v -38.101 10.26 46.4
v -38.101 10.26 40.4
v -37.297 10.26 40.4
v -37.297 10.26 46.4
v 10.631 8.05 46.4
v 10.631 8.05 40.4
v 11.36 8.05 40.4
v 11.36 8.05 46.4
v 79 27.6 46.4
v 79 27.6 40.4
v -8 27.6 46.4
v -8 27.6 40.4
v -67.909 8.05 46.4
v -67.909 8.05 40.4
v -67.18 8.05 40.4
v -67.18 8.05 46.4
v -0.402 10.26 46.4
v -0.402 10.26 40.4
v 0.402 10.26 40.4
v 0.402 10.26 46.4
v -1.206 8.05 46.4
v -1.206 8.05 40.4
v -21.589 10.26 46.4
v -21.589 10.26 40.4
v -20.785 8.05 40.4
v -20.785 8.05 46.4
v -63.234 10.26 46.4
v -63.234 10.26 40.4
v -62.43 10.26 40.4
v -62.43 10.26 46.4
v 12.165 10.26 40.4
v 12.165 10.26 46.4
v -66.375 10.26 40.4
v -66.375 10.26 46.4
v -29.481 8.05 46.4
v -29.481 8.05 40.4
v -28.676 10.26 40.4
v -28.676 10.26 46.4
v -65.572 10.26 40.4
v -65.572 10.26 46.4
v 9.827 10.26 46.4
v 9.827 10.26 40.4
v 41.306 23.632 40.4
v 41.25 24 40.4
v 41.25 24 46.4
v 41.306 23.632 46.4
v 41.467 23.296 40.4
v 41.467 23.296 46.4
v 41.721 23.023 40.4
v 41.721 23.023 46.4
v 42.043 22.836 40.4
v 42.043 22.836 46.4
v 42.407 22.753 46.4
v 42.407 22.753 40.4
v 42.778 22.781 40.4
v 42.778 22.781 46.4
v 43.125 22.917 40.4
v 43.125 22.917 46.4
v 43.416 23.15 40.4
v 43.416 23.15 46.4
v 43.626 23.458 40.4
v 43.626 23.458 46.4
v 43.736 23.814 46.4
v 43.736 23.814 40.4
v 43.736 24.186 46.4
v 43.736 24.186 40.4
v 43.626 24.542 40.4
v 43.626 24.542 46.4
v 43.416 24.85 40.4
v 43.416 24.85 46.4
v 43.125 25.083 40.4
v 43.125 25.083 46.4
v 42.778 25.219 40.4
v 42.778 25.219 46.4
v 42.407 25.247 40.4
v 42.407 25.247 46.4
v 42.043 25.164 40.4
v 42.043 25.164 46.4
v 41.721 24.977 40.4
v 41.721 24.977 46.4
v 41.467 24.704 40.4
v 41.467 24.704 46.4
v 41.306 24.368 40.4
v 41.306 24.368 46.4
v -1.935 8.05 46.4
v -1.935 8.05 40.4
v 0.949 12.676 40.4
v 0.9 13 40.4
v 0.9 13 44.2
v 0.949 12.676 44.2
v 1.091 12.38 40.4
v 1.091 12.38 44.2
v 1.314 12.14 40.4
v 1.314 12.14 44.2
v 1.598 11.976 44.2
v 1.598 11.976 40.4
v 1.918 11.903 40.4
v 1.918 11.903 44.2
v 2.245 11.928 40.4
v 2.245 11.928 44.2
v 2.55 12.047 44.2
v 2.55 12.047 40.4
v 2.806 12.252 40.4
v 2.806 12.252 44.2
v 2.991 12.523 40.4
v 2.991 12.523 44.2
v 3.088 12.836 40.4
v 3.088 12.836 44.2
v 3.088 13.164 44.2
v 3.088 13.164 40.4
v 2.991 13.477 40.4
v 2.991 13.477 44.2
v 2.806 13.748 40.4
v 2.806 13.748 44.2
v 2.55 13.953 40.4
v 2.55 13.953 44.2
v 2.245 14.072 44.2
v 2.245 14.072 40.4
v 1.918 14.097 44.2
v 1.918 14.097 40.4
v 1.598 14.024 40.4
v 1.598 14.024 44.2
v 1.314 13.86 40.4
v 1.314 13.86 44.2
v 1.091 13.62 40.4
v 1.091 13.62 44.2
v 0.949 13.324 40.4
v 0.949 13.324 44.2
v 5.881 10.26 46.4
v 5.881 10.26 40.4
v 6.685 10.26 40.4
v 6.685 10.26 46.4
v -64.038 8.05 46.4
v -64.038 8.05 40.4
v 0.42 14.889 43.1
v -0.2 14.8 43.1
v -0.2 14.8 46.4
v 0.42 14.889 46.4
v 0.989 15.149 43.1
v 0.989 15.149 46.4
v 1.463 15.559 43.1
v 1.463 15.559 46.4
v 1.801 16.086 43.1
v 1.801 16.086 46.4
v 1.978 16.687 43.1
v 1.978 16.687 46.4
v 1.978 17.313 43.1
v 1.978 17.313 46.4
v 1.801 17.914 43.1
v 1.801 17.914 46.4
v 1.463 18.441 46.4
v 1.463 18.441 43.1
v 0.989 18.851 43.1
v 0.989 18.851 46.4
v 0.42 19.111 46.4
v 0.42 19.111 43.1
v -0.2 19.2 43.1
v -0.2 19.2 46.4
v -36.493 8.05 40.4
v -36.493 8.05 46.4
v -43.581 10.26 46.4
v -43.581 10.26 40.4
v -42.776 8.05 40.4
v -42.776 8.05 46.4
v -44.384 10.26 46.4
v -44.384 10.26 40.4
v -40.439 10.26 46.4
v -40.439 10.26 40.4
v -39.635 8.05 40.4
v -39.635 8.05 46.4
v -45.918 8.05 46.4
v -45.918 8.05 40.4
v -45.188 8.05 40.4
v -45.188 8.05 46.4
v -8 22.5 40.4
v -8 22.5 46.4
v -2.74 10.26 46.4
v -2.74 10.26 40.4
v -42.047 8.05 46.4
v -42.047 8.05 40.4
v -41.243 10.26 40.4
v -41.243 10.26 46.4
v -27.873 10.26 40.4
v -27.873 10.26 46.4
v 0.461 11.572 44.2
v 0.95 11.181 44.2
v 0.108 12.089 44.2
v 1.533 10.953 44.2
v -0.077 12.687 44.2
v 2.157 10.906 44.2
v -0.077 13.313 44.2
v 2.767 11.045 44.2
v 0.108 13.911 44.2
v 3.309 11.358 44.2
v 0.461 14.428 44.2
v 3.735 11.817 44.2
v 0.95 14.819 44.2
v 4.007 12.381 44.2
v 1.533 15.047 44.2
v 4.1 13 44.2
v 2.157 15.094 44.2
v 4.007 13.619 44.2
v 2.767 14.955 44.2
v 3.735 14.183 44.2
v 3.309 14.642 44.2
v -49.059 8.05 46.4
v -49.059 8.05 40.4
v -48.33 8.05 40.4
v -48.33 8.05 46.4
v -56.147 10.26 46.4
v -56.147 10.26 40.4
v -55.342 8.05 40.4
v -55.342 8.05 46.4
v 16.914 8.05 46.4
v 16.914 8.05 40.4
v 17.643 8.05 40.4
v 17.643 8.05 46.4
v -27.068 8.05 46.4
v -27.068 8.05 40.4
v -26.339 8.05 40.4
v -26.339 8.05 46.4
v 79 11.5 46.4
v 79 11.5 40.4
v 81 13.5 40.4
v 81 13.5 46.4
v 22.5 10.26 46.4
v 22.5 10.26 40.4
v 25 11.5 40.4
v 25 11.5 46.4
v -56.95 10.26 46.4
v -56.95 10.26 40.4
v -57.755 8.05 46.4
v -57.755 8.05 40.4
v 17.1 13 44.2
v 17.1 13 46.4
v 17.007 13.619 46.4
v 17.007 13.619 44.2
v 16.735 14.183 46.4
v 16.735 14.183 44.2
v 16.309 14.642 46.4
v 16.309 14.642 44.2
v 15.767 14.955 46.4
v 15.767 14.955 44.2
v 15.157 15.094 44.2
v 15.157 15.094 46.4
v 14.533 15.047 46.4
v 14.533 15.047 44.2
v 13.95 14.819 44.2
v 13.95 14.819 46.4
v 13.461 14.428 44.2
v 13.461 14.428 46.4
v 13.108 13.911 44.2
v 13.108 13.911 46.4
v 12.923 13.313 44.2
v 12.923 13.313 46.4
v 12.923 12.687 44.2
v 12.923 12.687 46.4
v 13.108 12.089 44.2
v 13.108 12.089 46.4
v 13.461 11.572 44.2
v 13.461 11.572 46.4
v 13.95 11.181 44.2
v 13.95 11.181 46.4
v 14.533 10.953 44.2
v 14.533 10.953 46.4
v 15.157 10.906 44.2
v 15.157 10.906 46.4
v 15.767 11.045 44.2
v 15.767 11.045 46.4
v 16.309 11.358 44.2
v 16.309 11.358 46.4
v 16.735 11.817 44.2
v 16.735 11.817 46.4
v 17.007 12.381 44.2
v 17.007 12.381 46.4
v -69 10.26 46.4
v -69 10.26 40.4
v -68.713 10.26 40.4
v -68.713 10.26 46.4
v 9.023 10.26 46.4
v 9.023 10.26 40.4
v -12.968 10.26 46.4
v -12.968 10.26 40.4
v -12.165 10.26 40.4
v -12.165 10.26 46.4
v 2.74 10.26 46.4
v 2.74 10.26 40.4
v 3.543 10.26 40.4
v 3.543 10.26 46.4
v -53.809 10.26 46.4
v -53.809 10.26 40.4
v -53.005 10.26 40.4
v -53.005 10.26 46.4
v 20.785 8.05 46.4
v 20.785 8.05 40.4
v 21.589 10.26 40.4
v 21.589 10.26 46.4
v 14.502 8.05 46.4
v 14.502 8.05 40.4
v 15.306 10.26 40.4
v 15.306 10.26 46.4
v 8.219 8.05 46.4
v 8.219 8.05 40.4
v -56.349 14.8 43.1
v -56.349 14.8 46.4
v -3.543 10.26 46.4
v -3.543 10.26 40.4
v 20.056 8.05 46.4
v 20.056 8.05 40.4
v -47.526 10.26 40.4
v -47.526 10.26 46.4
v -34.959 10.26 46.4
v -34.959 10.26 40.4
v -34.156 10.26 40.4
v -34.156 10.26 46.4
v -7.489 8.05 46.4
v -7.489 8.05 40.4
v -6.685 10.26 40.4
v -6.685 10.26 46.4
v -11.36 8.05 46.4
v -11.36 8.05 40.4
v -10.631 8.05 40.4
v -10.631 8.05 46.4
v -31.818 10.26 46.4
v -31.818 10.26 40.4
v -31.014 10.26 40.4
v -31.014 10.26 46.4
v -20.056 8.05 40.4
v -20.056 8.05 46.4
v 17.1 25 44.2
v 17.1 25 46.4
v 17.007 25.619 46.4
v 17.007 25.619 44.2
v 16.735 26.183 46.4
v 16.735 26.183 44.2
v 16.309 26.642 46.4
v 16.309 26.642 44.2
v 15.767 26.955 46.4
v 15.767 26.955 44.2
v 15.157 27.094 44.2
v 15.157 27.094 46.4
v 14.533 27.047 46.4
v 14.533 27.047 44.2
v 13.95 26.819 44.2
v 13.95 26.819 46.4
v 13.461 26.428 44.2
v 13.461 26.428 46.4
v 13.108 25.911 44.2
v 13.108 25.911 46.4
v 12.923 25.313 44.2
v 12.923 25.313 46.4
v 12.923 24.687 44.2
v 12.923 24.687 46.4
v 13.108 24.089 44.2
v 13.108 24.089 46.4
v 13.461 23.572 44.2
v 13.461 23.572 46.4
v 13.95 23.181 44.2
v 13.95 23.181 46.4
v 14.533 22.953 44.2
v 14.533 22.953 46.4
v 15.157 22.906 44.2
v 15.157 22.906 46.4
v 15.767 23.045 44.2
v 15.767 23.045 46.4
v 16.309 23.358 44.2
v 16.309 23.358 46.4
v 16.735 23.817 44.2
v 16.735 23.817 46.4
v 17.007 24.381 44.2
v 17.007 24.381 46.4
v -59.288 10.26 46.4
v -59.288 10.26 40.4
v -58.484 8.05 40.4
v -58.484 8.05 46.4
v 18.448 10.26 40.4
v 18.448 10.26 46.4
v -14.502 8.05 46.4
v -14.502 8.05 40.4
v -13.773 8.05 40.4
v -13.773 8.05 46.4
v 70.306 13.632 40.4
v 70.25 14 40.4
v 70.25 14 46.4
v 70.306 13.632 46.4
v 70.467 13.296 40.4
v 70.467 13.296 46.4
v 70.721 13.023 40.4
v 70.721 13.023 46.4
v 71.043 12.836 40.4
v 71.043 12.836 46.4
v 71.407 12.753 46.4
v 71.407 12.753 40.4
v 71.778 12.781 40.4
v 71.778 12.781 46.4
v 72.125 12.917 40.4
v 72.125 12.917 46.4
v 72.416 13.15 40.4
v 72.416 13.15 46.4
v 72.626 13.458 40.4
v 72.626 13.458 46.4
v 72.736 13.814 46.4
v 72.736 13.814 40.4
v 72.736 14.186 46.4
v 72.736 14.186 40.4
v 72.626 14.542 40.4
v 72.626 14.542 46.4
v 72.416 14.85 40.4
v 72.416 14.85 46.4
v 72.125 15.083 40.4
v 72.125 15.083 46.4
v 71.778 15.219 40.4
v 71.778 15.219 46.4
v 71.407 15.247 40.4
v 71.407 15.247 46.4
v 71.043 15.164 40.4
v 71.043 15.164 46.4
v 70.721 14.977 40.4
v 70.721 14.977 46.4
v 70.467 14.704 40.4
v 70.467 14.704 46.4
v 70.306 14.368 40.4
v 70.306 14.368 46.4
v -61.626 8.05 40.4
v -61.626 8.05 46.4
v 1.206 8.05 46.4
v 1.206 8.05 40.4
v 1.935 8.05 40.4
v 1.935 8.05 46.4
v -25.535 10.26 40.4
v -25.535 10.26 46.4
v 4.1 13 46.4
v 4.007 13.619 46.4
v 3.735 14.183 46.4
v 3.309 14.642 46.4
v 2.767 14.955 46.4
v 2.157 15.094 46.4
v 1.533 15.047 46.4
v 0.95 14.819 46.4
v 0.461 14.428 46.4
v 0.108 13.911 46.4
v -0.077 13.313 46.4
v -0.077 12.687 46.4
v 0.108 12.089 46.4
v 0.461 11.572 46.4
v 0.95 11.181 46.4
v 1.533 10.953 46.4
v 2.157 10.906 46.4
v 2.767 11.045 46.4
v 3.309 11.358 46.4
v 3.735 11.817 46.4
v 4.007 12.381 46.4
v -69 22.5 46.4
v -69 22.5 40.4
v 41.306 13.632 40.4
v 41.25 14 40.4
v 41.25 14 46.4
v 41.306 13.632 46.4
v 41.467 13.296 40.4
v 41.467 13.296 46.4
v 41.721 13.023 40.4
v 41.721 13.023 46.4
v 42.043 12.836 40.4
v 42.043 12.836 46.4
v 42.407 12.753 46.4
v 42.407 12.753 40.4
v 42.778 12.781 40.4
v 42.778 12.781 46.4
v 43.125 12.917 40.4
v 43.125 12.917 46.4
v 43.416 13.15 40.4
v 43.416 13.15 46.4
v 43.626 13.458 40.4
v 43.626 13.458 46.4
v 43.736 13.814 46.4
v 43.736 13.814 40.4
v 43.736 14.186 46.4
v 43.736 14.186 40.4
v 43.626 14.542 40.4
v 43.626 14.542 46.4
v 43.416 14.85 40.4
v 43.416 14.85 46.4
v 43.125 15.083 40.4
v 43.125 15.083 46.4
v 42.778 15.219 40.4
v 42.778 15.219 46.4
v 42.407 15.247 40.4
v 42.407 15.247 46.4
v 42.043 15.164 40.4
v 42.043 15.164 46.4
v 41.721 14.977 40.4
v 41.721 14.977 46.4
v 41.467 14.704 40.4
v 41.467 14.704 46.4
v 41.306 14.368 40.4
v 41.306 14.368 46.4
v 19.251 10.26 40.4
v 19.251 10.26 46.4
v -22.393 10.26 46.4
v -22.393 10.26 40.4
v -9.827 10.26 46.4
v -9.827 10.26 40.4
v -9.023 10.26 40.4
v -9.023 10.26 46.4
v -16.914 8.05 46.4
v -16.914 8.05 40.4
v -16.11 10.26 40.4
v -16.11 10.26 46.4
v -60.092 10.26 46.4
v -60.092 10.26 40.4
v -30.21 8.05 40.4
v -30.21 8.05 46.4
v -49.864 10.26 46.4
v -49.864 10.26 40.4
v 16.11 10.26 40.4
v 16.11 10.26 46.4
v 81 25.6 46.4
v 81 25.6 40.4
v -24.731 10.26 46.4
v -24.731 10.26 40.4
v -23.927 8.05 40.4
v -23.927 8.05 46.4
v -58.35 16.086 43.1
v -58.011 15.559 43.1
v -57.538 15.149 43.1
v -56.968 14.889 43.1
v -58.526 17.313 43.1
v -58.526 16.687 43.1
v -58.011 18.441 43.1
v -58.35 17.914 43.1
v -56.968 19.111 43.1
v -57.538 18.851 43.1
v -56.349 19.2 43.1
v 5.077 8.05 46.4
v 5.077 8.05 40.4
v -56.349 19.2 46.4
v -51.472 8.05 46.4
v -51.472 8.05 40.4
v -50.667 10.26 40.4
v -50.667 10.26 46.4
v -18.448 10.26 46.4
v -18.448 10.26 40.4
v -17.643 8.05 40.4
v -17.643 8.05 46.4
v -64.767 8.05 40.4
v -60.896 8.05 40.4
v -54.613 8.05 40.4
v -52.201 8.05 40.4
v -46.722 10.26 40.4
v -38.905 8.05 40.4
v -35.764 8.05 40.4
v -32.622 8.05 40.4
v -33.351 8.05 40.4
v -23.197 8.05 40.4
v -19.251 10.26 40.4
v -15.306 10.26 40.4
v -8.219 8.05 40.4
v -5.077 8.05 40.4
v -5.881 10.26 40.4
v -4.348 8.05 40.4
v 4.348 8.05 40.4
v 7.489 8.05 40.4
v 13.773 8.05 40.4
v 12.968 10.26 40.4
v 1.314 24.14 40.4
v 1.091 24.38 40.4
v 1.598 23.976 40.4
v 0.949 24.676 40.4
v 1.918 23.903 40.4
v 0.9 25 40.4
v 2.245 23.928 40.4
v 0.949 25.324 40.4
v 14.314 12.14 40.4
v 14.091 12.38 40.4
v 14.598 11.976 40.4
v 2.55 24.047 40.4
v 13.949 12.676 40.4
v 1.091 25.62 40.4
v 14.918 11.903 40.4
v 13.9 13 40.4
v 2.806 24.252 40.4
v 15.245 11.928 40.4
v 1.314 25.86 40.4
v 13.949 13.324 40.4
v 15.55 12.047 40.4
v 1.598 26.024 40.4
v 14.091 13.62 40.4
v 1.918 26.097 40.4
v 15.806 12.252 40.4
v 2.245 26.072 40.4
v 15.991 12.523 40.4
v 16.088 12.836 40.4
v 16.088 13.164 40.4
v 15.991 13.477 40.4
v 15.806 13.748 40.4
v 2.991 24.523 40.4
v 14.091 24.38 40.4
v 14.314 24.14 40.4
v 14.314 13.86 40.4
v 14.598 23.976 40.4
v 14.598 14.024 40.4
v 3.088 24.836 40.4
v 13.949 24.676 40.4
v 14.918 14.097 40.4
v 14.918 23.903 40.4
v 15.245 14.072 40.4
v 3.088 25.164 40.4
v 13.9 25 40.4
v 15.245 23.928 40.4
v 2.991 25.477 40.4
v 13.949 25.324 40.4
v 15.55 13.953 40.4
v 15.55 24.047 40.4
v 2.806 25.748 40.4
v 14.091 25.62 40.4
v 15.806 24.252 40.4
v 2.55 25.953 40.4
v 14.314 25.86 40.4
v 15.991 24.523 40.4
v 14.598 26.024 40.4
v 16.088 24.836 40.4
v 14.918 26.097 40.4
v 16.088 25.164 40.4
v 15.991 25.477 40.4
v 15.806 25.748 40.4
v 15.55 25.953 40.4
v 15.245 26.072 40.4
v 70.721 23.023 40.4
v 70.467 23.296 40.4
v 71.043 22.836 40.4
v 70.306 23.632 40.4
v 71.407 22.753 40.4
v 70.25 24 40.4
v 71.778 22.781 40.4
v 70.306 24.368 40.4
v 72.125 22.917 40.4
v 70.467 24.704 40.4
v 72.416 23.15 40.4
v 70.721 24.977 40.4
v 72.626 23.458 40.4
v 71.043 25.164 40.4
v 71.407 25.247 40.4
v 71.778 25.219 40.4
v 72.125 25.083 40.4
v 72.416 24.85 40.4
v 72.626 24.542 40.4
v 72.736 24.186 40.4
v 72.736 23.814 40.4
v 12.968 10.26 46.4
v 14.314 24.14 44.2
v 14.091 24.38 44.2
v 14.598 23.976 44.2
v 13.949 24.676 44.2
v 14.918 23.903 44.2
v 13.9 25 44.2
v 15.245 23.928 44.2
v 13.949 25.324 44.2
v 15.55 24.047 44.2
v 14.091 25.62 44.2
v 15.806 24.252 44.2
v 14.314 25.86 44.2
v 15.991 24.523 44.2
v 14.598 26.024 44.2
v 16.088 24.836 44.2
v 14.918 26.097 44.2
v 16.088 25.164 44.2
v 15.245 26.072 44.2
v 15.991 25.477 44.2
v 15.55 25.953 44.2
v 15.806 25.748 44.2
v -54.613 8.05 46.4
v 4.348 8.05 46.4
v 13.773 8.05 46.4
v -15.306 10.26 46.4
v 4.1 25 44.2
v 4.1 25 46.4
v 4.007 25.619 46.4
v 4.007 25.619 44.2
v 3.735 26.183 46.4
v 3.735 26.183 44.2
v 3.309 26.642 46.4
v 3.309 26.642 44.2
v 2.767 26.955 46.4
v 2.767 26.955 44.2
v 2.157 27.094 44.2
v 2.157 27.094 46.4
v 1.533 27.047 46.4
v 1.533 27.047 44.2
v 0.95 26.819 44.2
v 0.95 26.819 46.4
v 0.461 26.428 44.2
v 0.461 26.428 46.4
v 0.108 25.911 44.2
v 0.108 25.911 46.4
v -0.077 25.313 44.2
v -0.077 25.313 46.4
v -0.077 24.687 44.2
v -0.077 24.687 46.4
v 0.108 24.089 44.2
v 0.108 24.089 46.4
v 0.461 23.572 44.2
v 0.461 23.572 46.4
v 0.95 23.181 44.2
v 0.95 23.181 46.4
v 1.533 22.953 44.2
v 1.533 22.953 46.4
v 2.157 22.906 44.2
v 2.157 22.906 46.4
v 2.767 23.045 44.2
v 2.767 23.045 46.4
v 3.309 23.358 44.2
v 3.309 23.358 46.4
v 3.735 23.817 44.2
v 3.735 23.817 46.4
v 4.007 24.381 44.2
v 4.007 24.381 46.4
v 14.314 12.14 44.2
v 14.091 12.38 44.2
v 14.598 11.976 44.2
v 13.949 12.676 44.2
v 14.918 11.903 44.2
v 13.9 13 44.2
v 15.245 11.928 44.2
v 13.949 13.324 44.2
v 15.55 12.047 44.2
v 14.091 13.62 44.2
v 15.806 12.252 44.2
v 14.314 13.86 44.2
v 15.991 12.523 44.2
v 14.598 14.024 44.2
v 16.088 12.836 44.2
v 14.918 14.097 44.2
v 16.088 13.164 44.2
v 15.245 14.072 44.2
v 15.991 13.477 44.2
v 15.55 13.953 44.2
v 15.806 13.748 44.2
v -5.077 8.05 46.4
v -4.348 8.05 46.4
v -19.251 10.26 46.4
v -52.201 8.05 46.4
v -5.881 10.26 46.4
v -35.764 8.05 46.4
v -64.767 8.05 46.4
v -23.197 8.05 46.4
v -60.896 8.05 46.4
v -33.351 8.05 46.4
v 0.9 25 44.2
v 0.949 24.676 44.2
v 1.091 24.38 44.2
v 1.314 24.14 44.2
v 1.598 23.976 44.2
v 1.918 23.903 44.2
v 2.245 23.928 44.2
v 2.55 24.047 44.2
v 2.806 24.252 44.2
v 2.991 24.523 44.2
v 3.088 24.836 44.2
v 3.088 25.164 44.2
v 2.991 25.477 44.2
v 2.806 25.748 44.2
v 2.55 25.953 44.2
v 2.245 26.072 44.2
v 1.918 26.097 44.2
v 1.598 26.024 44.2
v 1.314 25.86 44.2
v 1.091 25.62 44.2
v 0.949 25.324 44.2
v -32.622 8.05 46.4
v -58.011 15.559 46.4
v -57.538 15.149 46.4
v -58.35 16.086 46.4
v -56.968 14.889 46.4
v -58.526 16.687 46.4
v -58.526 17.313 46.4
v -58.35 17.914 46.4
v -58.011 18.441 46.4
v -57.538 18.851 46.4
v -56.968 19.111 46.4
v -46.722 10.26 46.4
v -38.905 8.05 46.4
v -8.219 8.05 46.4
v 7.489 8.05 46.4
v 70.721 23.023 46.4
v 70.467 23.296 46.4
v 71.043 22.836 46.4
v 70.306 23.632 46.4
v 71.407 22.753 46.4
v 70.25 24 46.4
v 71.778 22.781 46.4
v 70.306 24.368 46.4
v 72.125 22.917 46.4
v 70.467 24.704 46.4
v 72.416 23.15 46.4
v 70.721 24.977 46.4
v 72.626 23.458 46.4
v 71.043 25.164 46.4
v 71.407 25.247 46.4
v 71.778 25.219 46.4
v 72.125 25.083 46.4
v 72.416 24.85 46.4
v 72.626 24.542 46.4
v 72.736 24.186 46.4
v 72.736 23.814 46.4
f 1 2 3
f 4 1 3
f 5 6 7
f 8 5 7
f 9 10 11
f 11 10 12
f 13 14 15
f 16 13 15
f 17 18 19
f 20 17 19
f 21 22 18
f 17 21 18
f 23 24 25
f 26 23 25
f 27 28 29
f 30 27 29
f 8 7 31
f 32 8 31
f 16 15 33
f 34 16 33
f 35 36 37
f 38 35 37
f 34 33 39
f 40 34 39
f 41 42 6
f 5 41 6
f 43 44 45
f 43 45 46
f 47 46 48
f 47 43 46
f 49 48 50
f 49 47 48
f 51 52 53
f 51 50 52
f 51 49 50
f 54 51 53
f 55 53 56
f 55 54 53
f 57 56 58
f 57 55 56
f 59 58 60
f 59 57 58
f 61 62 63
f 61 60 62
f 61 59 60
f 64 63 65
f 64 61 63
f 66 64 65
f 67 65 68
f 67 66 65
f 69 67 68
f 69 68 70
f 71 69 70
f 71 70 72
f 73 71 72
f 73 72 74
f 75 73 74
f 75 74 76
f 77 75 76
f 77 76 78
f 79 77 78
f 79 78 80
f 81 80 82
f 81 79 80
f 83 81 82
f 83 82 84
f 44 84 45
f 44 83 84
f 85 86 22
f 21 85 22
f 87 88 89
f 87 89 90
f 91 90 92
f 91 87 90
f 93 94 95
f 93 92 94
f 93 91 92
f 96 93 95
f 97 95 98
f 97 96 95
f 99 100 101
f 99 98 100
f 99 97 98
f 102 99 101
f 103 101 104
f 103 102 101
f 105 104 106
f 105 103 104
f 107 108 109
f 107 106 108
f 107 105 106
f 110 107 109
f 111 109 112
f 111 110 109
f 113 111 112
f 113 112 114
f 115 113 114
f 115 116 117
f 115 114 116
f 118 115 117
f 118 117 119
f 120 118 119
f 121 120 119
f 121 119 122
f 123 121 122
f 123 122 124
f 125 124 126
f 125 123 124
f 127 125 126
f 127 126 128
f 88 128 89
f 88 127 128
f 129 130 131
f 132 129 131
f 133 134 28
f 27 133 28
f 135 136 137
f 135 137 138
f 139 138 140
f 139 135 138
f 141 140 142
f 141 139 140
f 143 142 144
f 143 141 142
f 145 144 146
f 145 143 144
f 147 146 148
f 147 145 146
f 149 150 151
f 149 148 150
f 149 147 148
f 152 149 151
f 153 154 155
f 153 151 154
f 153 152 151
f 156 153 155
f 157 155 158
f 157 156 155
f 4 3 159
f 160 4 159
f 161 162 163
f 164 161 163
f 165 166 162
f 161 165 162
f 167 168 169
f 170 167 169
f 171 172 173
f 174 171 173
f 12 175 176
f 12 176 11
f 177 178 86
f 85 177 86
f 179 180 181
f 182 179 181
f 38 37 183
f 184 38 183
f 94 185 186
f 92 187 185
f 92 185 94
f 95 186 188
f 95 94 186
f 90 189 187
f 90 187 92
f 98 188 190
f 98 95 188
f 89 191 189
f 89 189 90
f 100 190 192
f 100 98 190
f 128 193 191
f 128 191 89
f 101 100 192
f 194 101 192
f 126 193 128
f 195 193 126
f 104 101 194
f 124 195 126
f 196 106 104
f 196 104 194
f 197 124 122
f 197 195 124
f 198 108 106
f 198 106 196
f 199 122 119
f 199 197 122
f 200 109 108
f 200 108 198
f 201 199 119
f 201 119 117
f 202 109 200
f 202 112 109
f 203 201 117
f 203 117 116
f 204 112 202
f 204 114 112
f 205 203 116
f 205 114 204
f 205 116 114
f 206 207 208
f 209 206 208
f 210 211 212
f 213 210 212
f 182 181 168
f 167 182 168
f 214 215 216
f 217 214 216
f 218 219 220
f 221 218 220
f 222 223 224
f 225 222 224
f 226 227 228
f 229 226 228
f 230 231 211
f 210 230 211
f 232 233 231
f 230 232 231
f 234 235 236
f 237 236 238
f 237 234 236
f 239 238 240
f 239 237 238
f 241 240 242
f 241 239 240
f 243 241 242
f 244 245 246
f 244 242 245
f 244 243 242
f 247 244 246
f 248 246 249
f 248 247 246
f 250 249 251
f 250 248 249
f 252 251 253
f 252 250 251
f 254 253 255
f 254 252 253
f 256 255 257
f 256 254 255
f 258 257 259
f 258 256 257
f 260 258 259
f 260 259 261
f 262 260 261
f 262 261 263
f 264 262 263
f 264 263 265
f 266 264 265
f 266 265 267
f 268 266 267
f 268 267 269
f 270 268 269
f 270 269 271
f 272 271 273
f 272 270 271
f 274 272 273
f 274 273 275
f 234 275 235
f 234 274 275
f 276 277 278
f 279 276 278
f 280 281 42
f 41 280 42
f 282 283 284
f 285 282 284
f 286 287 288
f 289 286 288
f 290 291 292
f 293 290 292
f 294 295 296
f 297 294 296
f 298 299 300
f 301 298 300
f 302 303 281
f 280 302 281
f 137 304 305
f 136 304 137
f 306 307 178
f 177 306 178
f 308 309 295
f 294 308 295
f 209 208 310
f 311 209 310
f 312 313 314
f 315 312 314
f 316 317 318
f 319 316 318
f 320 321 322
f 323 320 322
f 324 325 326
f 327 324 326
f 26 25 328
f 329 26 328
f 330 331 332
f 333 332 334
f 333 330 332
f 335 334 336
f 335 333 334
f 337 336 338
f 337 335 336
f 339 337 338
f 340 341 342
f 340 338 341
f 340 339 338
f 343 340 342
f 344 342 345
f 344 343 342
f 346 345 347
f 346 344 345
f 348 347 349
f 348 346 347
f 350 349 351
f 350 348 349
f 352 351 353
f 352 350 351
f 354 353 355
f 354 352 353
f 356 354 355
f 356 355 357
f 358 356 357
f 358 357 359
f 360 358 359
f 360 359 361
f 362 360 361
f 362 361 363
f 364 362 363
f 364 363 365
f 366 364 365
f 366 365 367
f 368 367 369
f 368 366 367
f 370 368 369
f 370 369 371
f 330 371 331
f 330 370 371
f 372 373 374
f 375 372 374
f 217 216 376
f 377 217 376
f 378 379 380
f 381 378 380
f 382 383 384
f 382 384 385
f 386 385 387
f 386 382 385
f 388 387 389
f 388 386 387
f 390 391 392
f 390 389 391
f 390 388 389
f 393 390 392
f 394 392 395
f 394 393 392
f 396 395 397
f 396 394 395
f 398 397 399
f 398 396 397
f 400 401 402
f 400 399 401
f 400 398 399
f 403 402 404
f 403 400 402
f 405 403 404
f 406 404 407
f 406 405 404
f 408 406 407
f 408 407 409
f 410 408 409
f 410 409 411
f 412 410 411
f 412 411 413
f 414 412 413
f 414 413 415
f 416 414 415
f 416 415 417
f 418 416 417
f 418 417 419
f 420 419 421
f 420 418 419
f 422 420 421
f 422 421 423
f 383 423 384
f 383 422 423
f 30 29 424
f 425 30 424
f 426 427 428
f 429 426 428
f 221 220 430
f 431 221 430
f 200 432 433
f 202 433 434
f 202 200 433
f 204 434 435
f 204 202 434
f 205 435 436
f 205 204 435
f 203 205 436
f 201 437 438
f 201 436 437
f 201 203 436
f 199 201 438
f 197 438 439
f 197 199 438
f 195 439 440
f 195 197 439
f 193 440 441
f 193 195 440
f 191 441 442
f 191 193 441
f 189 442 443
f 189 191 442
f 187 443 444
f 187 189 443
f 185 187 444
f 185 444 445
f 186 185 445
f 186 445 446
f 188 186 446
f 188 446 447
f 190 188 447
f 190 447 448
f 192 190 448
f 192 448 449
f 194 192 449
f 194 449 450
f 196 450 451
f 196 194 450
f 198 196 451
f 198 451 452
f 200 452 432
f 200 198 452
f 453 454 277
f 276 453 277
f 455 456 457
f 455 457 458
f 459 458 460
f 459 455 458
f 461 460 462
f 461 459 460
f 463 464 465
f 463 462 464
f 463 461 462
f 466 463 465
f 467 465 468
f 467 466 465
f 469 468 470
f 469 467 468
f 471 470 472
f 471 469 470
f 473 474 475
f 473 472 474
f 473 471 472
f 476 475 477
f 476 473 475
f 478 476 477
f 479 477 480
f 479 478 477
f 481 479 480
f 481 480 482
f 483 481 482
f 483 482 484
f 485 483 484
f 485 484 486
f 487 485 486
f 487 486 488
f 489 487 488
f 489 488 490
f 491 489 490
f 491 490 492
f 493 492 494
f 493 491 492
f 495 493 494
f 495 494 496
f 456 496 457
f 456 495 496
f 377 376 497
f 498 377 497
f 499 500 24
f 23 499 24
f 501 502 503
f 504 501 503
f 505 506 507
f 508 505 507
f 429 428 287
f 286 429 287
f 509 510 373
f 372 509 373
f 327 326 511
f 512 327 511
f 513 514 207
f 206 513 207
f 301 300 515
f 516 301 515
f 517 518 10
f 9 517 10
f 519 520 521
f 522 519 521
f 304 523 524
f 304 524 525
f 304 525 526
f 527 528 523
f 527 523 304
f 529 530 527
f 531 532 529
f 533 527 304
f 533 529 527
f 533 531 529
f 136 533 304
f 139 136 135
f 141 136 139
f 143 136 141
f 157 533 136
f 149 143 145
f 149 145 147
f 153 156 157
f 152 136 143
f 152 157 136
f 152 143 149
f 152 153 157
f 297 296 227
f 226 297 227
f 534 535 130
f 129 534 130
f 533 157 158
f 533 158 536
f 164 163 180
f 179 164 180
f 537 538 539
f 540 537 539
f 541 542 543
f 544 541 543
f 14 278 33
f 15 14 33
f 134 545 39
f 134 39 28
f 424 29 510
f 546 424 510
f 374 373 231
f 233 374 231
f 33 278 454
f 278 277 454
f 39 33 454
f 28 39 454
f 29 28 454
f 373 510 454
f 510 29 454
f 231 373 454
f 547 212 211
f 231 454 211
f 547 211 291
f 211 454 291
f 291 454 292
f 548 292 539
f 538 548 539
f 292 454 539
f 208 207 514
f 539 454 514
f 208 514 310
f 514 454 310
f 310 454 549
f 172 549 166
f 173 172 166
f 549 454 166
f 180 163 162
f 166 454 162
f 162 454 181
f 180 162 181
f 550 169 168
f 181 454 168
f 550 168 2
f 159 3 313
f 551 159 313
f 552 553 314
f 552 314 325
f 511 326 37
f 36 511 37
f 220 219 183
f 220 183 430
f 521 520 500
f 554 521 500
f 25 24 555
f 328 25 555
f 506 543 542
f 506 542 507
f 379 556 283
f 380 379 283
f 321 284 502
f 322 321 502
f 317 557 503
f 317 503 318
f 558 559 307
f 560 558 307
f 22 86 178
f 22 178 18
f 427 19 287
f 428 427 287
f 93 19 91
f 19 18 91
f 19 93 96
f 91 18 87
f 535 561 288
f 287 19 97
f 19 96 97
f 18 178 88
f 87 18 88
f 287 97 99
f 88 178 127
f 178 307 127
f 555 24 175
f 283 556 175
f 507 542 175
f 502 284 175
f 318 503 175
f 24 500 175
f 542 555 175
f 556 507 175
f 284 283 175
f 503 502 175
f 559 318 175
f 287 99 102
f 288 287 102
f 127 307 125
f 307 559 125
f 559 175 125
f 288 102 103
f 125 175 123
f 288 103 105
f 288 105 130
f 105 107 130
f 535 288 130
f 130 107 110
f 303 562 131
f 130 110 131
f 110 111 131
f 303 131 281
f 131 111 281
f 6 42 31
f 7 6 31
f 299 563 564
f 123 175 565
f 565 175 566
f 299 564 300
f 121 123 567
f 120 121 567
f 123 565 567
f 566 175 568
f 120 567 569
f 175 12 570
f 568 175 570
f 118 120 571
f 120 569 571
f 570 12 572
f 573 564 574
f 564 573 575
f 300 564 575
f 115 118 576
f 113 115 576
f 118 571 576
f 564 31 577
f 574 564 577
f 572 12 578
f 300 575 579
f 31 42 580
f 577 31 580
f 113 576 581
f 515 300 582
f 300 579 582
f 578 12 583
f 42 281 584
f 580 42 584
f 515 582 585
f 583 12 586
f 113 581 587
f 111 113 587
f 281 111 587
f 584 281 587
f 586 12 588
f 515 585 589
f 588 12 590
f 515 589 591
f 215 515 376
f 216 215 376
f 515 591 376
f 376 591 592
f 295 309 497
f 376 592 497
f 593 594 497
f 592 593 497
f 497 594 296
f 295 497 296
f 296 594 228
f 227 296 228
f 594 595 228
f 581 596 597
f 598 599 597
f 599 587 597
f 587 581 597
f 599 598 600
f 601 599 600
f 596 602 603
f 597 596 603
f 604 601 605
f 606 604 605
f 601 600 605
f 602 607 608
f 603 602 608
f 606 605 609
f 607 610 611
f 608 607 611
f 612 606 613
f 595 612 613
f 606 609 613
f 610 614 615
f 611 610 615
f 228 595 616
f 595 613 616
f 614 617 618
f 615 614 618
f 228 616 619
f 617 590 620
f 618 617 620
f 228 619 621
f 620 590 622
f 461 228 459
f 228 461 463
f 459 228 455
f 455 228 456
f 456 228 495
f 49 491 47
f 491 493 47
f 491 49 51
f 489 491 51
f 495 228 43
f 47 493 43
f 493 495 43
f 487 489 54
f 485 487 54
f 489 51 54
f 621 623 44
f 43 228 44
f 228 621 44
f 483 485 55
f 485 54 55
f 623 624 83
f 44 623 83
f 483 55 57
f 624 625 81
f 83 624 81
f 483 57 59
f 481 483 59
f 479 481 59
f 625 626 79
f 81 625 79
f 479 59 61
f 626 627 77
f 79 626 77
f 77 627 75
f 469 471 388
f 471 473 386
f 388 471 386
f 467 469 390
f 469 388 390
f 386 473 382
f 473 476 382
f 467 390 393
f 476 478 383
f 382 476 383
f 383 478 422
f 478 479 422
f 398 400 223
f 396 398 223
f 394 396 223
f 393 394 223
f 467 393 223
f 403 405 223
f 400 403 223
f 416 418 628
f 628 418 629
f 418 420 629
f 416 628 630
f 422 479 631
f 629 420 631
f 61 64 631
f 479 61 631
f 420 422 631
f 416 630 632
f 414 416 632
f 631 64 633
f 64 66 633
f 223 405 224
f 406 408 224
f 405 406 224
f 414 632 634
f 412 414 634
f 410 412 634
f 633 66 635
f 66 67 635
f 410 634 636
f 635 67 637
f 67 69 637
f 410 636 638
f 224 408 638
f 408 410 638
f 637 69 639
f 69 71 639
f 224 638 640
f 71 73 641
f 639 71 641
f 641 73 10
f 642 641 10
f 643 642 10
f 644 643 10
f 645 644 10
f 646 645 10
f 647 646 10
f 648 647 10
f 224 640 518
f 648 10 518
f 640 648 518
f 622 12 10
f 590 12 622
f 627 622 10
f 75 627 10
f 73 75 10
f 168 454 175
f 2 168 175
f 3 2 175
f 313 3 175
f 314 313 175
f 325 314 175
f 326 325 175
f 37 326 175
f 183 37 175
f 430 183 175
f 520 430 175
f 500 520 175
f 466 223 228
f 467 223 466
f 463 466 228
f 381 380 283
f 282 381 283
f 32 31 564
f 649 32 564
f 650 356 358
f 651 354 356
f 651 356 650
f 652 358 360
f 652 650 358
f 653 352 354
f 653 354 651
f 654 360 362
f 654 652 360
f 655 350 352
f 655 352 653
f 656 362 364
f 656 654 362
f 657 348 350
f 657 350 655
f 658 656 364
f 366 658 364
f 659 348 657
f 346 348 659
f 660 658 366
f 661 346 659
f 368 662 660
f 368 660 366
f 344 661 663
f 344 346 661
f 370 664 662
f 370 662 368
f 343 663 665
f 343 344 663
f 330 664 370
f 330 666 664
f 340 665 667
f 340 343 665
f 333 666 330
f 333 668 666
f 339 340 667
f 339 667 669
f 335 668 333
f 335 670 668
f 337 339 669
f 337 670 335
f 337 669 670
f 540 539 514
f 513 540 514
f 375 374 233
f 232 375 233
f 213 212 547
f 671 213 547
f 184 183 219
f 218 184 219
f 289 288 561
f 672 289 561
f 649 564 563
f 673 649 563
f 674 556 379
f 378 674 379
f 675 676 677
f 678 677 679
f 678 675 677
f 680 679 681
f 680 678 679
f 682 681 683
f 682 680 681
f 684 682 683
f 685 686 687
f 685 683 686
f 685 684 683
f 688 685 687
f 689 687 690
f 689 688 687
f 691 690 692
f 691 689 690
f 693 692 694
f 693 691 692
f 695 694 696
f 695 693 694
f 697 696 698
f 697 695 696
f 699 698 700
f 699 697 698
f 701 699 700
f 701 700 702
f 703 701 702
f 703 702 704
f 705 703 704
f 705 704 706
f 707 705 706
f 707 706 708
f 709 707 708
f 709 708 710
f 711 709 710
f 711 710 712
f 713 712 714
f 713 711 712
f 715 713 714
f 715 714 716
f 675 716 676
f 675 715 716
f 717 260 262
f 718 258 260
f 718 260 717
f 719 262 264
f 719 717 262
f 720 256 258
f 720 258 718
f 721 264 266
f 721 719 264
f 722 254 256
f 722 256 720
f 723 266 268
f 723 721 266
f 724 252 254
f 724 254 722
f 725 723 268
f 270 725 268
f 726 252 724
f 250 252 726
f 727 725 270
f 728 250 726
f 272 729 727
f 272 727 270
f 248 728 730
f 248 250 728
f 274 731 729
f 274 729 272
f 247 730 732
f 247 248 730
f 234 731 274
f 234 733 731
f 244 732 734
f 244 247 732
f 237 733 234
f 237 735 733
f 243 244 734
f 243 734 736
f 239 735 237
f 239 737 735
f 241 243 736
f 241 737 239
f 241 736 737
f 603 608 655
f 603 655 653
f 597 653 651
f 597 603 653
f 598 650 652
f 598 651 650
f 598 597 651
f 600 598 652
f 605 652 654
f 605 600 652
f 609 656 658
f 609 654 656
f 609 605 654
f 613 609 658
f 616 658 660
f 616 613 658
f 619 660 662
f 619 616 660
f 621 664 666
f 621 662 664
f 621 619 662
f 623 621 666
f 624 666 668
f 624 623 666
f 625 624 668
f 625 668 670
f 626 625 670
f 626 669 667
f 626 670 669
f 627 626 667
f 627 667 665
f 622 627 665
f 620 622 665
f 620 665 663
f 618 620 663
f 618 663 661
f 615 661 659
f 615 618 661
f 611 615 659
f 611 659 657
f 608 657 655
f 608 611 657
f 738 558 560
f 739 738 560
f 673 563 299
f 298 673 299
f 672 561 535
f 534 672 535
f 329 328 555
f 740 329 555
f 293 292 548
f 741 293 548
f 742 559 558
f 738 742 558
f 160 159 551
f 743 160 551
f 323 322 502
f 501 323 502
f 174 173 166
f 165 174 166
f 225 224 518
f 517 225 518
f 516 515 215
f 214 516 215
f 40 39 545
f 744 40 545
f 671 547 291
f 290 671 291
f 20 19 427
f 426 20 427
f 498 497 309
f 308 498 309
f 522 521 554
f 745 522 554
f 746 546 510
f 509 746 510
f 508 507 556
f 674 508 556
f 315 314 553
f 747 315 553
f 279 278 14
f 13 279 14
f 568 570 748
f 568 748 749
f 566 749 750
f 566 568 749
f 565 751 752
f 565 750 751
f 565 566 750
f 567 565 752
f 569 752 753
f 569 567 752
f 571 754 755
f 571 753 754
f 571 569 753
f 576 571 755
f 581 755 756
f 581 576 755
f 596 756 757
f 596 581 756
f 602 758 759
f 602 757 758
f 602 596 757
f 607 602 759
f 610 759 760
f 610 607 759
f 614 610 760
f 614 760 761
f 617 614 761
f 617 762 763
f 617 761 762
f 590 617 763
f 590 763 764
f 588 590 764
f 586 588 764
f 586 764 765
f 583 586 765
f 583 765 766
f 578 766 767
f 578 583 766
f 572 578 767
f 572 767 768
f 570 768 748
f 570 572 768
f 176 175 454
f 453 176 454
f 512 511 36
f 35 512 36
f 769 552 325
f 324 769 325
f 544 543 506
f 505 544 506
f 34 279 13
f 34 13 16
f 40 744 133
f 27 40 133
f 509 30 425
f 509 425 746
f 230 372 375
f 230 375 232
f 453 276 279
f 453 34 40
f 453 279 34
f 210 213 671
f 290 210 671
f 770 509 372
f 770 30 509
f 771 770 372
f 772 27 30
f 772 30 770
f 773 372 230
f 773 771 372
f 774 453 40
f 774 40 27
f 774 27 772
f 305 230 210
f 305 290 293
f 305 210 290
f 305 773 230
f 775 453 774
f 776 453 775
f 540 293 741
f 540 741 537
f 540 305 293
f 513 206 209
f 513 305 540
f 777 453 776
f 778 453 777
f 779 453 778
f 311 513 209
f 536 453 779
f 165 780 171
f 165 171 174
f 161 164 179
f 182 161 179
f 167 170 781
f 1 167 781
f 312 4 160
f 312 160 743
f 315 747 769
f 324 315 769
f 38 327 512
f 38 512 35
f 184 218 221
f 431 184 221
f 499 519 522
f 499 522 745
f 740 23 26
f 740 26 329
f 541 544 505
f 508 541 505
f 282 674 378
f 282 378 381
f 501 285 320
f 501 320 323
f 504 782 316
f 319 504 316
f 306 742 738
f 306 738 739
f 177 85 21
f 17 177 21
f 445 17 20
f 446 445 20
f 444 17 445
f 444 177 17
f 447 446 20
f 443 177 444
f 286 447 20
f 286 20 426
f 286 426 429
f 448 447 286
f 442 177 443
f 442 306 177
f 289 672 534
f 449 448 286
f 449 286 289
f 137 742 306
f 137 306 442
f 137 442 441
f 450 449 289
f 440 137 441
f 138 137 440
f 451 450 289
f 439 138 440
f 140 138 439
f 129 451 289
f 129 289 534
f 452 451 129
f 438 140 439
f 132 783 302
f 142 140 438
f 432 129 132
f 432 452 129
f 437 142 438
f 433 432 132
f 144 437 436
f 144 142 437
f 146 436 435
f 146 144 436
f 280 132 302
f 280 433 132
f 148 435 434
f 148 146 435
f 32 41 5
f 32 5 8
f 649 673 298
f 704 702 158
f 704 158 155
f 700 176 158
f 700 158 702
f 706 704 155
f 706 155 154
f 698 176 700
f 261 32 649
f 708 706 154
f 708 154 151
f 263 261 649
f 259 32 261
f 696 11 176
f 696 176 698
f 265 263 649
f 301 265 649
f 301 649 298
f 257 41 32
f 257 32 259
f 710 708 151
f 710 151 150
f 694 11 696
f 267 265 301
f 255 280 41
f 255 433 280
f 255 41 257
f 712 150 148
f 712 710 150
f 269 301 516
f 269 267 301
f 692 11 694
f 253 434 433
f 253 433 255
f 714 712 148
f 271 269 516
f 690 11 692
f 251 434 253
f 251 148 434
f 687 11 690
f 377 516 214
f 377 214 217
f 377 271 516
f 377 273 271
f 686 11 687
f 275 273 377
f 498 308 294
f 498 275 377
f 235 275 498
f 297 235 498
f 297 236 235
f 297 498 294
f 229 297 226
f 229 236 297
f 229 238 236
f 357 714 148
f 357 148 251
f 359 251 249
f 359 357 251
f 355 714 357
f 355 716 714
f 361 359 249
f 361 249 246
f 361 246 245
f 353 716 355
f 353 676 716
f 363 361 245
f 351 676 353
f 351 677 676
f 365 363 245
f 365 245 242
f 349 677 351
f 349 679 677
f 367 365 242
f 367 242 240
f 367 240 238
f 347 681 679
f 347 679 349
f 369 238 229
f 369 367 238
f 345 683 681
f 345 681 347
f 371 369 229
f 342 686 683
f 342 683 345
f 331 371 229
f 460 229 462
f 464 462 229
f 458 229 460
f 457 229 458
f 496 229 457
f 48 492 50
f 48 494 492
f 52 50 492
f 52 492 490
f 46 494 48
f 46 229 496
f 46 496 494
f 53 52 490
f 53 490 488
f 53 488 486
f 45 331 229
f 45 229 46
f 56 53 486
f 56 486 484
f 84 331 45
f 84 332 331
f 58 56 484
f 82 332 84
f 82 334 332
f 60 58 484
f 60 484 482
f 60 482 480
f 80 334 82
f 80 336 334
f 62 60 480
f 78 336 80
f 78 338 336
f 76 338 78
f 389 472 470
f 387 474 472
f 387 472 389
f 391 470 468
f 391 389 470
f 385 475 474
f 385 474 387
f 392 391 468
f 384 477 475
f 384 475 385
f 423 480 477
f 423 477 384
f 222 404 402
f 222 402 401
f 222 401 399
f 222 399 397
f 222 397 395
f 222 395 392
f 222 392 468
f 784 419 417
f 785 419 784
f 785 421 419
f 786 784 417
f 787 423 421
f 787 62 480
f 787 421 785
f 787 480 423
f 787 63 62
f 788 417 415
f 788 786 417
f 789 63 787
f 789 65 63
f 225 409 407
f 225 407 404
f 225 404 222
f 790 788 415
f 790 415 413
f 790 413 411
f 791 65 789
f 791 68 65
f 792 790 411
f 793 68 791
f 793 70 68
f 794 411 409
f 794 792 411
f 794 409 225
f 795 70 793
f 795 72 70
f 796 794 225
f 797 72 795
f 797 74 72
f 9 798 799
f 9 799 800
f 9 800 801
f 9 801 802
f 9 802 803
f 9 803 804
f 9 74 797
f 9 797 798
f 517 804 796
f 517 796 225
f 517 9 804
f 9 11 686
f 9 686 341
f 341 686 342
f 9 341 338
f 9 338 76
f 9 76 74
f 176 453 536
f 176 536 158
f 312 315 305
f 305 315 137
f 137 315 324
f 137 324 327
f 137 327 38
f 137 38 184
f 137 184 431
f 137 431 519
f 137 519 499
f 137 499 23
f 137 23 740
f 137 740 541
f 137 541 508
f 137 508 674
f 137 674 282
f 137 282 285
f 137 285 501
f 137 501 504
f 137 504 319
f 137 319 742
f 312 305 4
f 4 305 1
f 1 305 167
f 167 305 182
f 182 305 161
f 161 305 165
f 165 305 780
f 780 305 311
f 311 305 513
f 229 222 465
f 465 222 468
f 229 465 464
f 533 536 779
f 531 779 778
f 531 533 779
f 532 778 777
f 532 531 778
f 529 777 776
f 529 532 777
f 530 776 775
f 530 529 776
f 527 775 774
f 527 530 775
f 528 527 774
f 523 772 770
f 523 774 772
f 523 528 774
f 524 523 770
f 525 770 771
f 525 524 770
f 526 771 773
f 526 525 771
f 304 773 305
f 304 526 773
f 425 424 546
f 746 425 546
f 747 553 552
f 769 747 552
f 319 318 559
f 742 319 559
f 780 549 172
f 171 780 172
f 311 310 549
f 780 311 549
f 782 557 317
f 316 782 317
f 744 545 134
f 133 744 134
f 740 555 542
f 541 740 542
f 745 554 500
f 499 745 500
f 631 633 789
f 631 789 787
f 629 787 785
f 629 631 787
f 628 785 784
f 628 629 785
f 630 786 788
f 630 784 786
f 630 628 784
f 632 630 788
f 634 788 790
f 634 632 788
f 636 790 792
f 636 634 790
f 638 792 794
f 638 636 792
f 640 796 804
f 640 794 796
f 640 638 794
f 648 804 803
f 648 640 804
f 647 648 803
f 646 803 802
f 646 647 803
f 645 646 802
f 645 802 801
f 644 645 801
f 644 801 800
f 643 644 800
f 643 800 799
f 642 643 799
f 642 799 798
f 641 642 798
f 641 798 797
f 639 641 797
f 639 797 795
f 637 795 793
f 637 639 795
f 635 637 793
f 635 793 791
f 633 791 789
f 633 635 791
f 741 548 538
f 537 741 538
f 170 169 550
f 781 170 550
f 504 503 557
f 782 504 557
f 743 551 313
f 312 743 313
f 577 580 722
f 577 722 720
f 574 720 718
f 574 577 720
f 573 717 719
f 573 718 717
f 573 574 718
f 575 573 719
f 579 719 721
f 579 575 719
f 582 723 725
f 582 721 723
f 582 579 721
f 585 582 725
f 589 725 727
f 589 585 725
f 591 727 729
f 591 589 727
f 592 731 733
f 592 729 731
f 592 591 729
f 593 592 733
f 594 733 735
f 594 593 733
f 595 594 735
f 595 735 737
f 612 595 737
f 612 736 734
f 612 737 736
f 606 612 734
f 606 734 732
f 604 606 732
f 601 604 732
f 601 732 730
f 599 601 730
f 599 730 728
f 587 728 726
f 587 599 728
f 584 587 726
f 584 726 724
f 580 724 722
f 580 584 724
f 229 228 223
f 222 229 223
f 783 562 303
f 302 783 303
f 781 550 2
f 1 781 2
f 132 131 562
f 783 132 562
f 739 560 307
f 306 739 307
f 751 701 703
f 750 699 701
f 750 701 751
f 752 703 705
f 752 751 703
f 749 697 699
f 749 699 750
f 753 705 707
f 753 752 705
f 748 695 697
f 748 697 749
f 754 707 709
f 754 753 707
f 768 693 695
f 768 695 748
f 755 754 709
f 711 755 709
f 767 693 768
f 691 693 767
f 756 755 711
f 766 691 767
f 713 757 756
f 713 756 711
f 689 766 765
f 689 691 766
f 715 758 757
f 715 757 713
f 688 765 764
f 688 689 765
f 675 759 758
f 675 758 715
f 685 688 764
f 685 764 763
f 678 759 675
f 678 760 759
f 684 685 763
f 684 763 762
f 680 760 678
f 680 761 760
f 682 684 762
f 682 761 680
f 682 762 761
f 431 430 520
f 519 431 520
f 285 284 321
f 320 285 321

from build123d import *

# Parameters (mm, degrees)
MODULE_START                                   = 40.4
MODULE_1_RACK_WITH_VERTICAL_CARRIER_TAIL_DEPTH = 6
MGN7H_START                                    = 40.4
MGN7H_CARRIAGE_FIXING_PAD_PROFILE_W            = 33
MGN7H_CARRIAGE_FIXING_PAD_PROFILE_H            = 6.1
MGN7H_CARRIAGE_FIXING_PAD_DEPTH                = 6
FULL_START                                     = 43.1
FULL_STROKE_LIMIT_SLOT_56_55_MM_DEPTH          = 3.4
RADAR_START                                    = 40.3
RADAR_SEAT_FOUR_M3_PILOTS_29_X_10_MM_PRO_R     = 1.25
RADAR_SEAT_FOUR_M3_PILOTS_29_X_10_MM_DEPTH     = 6.2
MGN7H_START_2                                  = 40.3
MGN7H_FOUR_M2_CLEARANCES_13_X_12_MM_PROF_R     = 1.1
MGN7H_FOUR_M2_CLEARANCES_13_X_12_MM_DEPTH      = 6.2
MGN7H_START_3                                  = 44.2
MGN7H_M2_HEAD_POCKETS_PROFILE_R                = 2.1
MGN7H_M2_HEAD_POCKETS_DEPTH                    = 2.3


with BuildPart() as part:
    # Module 1 rack with vertical carrier  2 → Module 1 rack with vertical carrier tail (new body)
    with BuildSketch(Plane.XY.offset(MODULE_START)):
        Polygon((-69, 10.26), (-68.713242711, 10.26), (-67.908868493, 8.05), (-67.179615611, 8.05), (-66.375241394, 10.26), (-65.571650057, 10.26), (-64.767275839, 8.05), (-64.038022958, 8.05), (-63.23364874, 10.26), (-62.430057404, 10.26), (-61.625683186, 8.05), (-60.896430304, 8.05), (-60.092056086, 10.26), (-59.28846475, 10.26), (-58.484090532, 8.05), (-57.754837651, 8.05), (-56.950463433, 10.26), (-56.146872096, 10.26), (-55.342497879, 8.05), (-54.613244997, 8.05), (-53.808870779, 10.26), (-53.005279443, 10.26), (-52.200905225, 8.05), (-51.471652343, 8.05), (-50.667278126, 10.26), (-49.863686789, 10.26), (-49.059312572, 8.05), (-48.33005969, 8.05), (-47.525685472, 10.26), (-46.722094136, 10.26), (-45.917719918, 8.05), (-45.188467036, 8.05), (-44.384092819, 10.26), (-43.580501482, 10.26), (-42.776127264, 8.05), (-42.046874383, 8.05), (-41.242500165, 10.26), (-40.438908828, 10.26), (-39.634534611, 8.05), (-38.905281729, 8.05), (-38.100907511, 10.26), (-37.297316175, 10.26), (-36.492941957, 8.05), (-35.763689075, 8.05), (-34.959314858, 10.26), (-34.155723521, 10.26), (-33.351349304, 8.05), (-32.622096422, 8.05), (-31.817722204, 10.26), (-31.014130868, 10.26), (-30.20975665, 8.05), (-29.480503768, 8.05), (-28.676129551, 10.26), (-27.872538214, 10.26), (-27.068163996, 8.05), (-26.338911115, 8.05), (-25.534536897, 10.26), (-24.730945561, 10.26), (-23.926571343, 8.05), (-23.197318461, 8.05), (-22.392944243, 10.26), (-21.589352907, 10.26), (-20.784978689, 8.05), (-20.055725808, 8.05), (-19.25135159, 10.26), (-18.447760253, 10.26), (-17.643386036, 8.05), (-16.914133154, 8.05), (-16.109758936, 10.26), (-15.3061676, 10.26), (-14.501793382, 8.05), (-13.7725405, 8.05), (-12.968166283, 10.26), (-12.164574946, 10.26), (-11.360200728, 8.05), (-10.630947847, 8.05), (-9.826573629, 10.26), (-9.022982293, 10.26), (-8.218608075, 8.05), (-7.489355193, 8.05), (-6.684980975, 10.26), (-5.881389639, 10.26), (-5.077015421, 8.05), (-4.34776254, 8.05), (-3.543388322, 10.26), (-2.739796985, 10.26), (-1.935422768, 8.05), (-1.206169886, 8.05), (-0.401795668, 10.26), (0.401795668, 10.26), (1.206169886, 8.05), (1.935422768, 8.05), (2.739796985, 10.26), (3.543388322, 10.26), (4.34776254, 8.05), (5.077015421, 8.05), (5.881389639, 10.26), (6.684980975, 10.26), (7.489355193, 8.05), (8.218608075, 8.05), (9.022982293, 10.26), (9.826573629, 10.26), (10.630947847, 8.05), (11.360200728, 8.05), (12.164574946, 10.26), (12.968166283, 10.26), (13.7725405, 8.05), (14.501793382, 8.05), (15.3061676, 10.26), (16.109758936, 10.26), (16.914133154, 8.05), (17.643386036, 8.05), (18.447760253, 10.26), (19.25135159, 10.26), (20.055725808, 8.05), (20.784978689, 8.05), (21.589352907, 10.26), (22.5, 10.26), (25, 11.5), (79, 11.5), (81, 13.5), (81, 25.6), (79, 27.6), (22.5, 27.6), (22.5, 22.5), (-69, 22.5), align=None)
    extrude(amount=MODULE_1_RACK_WITH_VERTICAL_CARRIER_TAIL_DEPTH)

    # MGN7H carriage fixing pad profile → MGN7H carriage fixing pad (add)
    with BuildSketch(Plane.XY.offset(MGN7H_START)):
        with Locations((8.5, 24.55)):
            Rectangle(MGN7H_CARRIAGE_FIXING_PAD_PROFILE_W, MGN7H_CARRIAGE_FIXING_PAD_PROFILE_H)
    extrude(amount=MGN7H_CARRIAGE_FIXING_PAD_DEPTH)

    # Full stroke limit slot 56.55 mm profile → Full stroke limit slot 56.55 mm (cut)
    with BuildSketch(Plane.XY.offset(FULL_START)):
        with BuildLine():
            Line((-56.348667765, 14.8), (-0.2, 14.8))
            ThreePointArc((-0.2, 14.8), (2, 17), (-0.2, 19.2))
            Line((-0.2, 19.2), (-56.348667765, 19.2))
            ThreePointArc((-56.348667765, 19.2), (-58.548667765, 17), (-56.348667765, 14.8))
        make_face()
    extrude(amount=FULL_STROKE_LIMIT_SLOT_56_55_MM_DEPTH, mode=Mode.SUBTRACT)

    # Radar seat four M3 pilots 29 x 10 mm profile → Radar seat four M3 pilots 29 x 10 mm (cut)
    with BuildSketch(Plane.XY.offset(RADAR_START)):
        with Locations(Location((42.5, 14, 0), (0, 0, 180))):
            Circle(RADAR_SEAT_FOUR_M3_PILOTS_29_X_10_MM_PRO_R)
        with Locations(Location((42.5, 24, 0), (0, 0, 180))):
            Circle(RADAR_SEAT_FOUR_M3_PILOTS_29_X_10_MM_PRO_R)
        with Locations(Location((71.5, 14, 0), (0, 0, 180))):
            Circle(RADAR_SEAT_FOUR_M3_PILOTS_29_X_10_MM_PRO_R)
        with Locations(Location((71.5, 24, 0), (0, 0, 180))):
            Circle(RADAR_SEAT_FOUR_M3_PILOTS_29_X_10_MM_PRO_R)
    extrude(amount=RADAR_SEAT_FOUR_M3_PILOTS_29_X_10_MM_DEPTH, mode=Mode.SUBTRACT)

    # MGN7H four M2 clearances 13 x 12 mm profile → MGN7H four M2 clearances 13 x 12 mm (cut)
    with BuildSketch(Plane.XY.offset(MGN7H_START_2)):
        with Locations(Location((2, 13, 0), (0, 0, 180))):
            Circle(MGN7H_FOUR_M2_CLEARANCES_13_X_12_MM_PROF_R)
        with Locations(Location((2, 25, 0), (0, 0, 180))):
            Circle(MGN7H_FOUR_M2_CLEARANCES_13_X_12_MM_PROF_R)
        with Locations(Location((15, 13, 0), (0, 0, 180))):
            Circle(MGN7H_FOUR_M2_CLEARANCES_13_X_12_MM_PROF_R)
        with Locations(Location((15, 25, 0), (0, 0, 180))):
            Circle(MGN7H_FOUR_M2_CLEARANCES_13_X_12_MM_PROF_R)
    extrude(amount=MGN7H_FOUR_M2_CLEARANCES_13_X_12_MM_DEPTH, mode=Mode.SUBTRACT)

    # MGN7H M2 head pockets profile → MGN7H M2 head pockets (cut)
    with BuildSketch(Plane.XY.offset(MGN7H_START_3)):
        with Locations((2, 13)):
            Circle(MGN7H_M2_HEAD_POCKETS_PROFILE_R)
        with Locations((2, 25)):
            Circle(MGN7H_M2_HEAD_POCKETS_PROFILE_R)
        with Locations((15, 13)):
            Circle(MGN7H_M2_HEAD_POCKETS_PROFILE_R)
        with Locations((15, 25)):
            Circle(MGN7H_M2_HEAD_POCKETS_PROFILE_R)
    extrude(amount=MGN7H_M2_HEAD_POCKETS_DEPTH, mode=Mode.SUBTRACT)


solid = part.part
